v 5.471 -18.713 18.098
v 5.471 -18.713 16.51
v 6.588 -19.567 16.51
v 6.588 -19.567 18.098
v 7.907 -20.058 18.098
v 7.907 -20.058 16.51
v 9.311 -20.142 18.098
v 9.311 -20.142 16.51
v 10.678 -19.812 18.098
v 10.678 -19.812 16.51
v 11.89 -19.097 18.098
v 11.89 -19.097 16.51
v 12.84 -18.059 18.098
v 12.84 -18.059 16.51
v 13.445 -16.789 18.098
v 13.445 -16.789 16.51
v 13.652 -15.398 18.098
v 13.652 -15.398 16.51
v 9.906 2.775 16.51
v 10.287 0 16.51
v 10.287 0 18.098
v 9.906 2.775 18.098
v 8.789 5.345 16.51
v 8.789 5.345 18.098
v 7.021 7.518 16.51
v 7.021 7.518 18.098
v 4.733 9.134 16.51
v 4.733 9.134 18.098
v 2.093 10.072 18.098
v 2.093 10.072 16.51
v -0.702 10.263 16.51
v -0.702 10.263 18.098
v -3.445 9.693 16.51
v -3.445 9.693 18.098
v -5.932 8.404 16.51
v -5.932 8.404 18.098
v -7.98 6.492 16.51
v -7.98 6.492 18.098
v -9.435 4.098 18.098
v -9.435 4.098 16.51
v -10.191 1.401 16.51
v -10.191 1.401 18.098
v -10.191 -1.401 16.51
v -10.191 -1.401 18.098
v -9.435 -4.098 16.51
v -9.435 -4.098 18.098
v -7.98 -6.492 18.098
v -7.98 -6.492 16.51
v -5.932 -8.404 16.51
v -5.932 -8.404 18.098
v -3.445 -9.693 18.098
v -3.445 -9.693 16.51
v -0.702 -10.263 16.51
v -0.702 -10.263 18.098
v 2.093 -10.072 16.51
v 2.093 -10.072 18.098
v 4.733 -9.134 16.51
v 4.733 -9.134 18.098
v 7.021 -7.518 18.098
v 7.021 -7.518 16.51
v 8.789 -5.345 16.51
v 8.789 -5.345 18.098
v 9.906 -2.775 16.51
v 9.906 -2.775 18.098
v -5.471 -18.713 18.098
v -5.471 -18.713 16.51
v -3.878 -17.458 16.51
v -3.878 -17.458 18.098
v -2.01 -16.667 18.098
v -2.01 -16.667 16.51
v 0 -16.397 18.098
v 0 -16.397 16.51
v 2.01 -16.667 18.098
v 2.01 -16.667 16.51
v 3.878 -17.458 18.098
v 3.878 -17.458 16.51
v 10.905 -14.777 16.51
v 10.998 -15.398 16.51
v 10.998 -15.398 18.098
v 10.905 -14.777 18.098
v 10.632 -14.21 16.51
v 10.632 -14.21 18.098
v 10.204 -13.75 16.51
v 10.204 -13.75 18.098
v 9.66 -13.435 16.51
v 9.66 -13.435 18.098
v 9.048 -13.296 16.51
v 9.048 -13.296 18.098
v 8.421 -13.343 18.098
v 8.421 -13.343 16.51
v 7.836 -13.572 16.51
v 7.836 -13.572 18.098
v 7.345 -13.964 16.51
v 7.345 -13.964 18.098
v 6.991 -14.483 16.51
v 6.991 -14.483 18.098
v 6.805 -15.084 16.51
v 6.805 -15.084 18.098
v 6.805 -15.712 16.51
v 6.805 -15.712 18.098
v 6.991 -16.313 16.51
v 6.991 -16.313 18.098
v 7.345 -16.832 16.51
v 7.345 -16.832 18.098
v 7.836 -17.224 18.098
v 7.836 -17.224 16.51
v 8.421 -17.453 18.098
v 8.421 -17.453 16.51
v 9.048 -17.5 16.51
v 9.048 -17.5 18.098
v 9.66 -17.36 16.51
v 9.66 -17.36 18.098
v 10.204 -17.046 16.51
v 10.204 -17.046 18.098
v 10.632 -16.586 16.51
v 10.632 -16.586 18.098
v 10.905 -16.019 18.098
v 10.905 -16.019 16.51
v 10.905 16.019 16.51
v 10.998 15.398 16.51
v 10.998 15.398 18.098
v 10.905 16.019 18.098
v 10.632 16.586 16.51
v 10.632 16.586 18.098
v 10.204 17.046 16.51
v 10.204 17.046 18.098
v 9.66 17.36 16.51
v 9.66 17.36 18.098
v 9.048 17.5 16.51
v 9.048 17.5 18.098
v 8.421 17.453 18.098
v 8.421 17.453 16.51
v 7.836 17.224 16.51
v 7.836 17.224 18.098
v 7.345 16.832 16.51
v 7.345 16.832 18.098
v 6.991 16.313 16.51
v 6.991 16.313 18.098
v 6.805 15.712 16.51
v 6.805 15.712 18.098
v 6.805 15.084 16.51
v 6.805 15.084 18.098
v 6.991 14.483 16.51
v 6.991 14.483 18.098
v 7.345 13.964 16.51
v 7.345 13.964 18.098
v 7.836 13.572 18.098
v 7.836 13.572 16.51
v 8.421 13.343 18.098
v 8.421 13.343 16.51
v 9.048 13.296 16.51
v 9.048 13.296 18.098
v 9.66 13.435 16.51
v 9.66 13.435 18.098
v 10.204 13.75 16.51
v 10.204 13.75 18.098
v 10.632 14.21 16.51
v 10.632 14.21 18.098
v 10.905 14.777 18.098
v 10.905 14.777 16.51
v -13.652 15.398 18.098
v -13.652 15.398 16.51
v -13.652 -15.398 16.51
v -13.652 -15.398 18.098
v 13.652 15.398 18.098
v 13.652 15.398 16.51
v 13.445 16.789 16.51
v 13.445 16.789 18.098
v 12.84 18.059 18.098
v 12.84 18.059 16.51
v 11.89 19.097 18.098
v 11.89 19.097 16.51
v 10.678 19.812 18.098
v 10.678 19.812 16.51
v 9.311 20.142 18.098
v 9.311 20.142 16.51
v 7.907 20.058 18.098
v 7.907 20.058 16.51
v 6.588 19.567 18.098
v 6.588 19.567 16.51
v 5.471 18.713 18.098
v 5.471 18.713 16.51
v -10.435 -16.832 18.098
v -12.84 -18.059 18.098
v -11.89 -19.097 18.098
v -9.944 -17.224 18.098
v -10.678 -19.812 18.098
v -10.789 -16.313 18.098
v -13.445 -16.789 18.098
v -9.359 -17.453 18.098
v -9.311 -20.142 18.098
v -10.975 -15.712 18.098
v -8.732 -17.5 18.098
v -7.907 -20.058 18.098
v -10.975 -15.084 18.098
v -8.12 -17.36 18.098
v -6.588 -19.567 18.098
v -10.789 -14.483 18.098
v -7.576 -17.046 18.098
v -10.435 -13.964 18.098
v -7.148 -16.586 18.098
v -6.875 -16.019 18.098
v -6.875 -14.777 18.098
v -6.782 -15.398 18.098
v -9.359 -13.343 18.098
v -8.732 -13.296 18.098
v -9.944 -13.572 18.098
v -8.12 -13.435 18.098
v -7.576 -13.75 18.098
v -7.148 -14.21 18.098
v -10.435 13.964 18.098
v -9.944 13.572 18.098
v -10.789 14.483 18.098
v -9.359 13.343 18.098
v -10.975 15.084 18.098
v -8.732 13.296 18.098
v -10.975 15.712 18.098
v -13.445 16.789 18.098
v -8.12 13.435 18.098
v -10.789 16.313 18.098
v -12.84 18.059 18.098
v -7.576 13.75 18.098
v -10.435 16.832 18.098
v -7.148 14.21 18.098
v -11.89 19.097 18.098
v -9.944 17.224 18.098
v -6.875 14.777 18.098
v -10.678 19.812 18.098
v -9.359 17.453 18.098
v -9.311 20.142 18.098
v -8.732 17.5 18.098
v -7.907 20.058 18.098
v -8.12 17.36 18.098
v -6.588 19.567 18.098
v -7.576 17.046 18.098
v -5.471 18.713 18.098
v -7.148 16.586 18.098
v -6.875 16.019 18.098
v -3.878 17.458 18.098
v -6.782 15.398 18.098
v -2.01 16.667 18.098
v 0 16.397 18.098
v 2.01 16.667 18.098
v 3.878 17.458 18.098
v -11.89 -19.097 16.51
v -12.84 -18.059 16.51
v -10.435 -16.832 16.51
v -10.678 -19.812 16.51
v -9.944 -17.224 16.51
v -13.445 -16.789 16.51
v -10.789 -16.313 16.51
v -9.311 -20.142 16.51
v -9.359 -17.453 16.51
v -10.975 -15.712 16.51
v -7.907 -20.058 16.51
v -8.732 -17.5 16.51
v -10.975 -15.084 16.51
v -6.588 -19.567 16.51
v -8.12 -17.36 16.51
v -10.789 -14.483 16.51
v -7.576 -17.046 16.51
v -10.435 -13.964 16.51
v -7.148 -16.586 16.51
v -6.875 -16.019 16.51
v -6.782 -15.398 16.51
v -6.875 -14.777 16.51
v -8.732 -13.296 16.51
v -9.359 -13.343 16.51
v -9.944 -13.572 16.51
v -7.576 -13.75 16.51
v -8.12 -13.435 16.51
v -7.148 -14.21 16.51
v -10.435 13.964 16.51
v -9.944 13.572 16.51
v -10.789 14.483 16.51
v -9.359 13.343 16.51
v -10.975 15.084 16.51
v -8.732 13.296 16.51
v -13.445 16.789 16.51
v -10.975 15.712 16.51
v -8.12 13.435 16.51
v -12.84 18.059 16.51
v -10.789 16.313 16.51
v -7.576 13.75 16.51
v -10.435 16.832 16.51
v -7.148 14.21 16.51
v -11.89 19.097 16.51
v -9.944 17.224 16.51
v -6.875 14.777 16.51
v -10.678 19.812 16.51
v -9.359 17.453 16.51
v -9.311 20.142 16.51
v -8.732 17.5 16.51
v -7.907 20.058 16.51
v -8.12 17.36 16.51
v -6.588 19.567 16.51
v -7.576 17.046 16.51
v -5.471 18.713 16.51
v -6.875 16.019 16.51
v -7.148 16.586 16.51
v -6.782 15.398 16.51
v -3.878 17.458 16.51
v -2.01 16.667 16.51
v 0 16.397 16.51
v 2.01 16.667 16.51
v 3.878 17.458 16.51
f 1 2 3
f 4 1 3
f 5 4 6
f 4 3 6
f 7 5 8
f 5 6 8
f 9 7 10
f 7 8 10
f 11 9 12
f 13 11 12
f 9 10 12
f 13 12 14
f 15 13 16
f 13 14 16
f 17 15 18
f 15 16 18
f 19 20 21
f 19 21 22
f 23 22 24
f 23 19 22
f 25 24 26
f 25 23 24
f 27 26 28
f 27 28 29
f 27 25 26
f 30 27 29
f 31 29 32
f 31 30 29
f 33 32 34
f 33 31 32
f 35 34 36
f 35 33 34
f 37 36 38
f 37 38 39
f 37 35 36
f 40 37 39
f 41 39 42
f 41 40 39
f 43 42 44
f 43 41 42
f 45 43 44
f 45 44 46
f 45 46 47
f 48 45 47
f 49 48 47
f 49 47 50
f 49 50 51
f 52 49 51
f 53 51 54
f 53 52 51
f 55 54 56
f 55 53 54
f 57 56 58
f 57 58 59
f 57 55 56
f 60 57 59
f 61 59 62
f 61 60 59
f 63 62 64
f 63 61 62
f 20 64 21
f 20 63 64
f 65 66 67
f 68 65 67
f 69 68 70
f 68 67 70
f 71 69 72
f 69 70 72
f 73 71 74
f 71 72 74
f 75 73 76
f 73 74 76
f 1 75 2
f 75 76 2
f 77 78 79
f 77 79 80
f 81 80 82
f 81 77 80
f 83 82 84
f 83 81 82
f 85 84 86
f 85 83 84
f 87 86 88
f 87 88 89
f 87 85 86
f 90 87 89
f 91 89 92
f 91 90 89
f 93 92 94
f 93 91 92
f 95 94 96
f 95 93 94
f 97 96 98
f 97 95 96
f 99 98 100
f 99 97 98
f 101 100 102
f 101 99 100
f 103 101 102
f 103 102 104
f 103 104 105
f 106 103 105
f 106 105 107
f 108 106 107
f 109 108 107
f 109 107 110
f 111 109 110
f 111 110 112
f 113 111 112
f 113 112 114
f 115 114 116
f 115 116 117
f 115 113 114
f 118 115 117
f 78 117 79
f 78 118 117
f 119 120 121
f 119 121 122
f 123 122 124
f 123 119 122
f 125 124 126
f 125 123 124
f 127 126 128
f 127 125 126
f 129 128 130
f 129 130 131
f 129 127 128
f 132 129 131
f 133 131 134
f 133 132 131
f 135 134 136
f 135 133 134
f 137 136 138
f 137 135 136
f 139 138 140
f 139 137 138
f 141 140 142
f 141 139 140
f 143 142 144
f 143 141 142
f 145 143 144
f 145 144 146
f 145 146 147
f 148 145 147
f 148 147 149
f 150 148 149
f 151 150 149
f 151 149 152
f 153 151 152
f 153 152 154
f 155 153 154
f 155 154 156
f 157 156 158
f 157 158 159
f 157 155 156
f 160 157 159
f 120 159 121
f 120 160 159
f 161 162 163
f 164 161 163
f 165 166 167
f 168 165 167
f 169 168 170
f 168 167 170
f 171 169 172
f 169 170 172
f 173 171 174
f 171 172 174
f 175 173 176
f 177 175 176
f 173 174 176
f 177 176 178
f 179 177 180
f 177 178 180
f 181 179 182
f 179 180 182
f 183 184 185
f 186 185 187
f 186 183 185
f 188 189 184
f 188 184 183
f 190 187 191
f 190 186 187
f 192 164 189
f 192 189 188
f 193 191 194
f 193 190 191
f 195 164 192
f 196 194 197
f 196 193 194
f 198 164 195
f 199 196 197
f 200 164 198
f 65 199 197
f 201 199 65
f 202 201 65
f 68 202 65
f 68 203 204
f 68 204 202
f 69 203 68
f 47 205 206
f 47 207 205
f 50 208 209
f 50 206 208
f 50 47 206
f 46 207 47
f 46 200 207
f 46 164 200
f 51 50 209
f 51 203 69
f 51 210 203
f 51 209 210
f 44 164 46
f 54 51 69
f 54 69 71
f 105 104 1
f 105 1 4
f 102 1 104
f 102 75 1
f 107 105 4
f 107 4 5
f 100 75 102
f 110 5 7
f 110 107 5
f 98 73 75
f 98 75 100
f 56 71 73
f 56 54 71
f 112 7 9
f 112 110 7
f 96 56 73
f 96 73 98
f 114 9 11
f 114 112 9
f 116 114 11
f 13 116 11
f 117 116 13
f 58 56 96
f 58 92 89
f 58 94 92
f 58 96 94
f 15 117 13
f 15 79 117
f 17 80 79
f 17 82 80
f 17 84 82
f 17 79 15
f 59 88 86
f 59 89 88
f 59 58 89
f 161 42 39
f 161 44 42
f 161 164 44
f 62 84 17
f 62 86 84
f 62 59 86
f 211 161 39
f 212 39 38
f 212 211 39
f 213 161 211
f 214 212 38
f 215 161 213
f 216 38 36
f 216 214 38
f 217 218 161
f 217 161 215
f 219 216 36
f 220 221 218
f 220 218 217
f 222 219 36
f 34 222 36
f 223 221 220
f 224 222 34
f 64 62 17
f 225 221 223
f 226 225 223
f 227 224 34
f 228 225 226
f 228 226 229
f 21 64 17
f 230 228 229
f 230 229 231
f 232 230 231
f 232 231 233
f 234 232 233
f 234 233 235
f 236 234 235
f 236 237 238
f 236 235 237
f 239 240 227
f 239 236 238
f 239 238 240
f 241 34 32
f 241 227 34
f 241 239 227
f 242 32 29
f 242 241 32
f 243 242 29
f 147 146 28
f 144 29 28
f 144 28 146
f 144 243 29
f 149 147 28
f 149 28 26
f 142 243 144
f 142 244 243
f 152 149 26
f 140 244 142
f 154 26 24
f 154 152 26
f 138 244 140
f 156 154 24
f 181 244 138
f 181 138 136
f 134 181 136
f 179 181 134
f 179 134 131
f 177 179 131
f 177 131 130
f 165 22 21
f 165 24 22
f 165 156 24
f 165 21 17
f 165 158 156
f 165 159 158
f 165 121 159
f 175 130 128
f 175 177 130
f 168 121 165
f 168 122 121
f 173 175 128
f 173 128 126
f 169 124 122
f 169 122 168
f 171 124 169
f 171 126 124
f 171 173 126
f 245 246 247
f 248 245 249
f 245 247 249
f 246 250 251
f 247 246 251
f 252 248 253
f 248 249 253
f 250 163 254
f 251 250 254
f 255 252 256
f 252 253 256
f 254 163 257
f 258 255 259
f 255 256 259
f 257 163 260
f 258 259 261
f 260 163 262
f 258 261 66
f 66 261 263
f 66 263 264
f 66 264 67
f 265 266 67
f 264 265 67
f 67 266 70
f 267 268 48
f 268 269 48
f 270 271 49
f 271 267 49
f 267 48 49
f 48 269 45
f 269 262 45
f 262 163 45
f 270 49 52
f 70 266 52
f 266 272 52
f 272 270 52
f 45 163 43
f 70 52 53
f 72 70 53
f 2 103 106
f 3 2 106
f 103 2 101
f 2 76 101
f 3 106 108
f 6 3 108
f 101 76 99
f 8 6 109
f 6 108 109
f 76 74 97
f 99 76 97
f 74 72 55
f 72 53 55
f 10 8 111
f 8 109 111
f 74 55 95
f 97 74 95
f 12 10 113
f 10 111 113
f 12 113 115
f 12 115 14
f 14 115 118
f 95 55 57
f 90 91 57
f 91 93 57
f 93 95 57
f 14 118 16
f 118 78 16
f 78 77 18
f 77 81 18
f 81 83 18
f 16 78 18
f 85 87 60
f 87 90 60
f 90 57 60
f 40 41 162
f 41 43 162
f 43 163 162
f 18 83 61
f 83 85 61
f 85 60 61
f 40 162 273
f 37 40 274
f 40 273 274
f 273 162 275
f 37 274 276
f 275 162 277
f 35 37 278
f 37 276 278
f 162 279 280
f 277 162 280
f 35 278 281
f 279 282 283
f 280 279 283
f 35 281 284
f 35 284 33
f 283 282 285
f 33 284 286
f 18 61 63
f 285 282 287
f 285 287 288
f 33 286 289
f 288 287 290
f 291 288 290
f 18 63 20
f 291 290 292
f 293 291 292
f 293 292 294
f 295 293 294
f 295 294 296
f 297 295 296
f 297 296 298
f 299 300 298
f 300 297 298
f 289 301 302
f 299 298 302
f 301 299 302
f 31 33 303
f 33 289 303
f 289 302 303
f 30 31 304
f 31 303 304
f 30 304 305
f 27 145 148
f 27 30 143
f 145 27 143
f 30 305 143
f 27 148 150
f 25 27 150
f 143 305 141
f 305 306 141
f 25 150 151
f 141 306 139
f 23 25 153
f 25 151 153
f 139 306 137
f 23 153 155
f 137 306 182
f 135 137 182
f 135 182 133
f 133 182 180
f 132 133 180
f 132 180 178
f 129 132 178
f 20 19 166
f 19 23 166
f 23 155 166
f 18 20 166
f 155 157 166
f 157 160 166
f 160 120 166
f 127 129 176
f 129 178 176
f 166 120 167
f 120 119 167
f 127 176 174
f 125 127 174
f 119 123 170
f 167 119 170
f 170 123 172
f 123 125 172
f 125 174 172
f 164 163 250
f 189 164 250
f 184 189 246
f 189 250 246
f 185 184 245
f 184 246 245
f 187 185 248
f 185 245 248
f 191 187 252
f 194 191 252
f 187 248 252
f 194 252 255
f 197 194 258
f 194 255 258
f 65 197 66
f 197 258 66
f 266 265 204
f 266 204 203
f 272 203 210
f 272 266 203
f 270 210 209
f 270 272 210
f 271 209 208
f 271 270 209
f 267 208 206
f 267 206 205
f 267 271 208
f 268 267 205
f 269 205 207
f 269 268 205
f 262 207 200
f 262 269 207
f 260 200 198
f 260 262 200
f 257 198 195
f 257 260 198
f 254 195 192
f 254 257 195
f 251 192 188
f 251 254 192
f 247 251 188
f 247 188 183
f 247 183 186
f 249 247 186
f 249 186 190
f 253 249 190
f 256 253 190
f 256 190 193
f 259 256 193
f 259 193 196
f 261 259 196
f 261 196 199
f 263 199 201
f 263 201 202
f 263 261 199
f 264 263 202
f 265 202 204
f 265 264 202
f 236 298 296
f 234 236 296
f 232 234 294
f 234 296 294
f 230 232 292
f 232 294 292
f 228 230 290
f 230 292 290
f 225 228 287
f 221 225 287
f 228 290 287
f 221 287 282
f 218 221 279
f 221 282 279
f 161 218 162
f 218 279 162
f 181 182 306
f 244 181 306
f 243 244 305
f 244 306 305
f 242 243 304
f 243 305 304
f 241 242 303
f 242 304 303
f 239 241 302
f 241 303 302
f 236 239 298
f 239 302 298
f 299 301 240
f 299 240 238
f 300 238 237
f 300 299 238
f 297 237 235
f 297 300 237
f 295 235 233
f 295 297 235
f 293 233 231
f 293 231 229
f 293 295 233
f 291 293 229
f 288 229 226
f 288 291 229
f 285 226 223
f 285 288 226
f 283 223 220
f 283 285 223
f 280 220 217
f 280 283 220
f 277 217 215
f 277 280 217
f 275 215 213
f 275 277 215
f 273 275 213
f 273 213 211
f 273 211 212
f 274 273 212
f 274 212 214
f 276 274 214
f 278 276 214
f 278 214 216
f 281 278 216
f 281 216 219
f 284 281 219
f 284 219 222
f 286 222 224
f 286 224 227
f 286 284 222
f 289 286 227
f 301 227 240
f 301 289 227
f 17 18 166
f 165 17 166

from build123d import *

# Parameters (mm, degrees)
SKETCH1_R           = 2.1082
SKETCH1_R_2         = 10.287
BOSS_EXTRUDE1_DEPTH = 1.5875


with BuildPart() as part:
    # Sketch1 → Boss-Extrude1 (new body)
    with BuildSketch(Plane.XY.offset(16.51)):
        with BuildLine():
            Line((13.6525, -15.397931679), (13.6525, 15.397931679))
            ThreePointArc((13.6525, 15.397931679), (10.678479761, 19.811858094), (5.470769231, 18.71308887))
            ThreePointArc((5.470769231, 18.71308887), (0, 16.397340374), (-5.470769231, 18.71308887))
            ThreePointArc((-5.470769231, 18.71308887), (-10.678479761, 19.811858094), (-13.6525, 15.397931679))
            Line((-13.6525, 15.397931679), (-13.6525, -15.397931679))
            ThreePointArc((-13.6525, -15.397931679), (-10.678479761, -19.811858094), (-5.470769231, -18.71308887))
            ThreePointArc((-5.470769231, -18.71308887), (0, -16.397340374), (5.470769231, -18.71308887))
            ThreePointArc((5.470769231, -18.71308887), (10.678479761, -19.811858094), (13.6525, -15.397931679))
        make_face()
        with Locations((8.89, -15.397931679)):
            Circle(SKETCH1_R, mode=Mode.SUBTRACT)
        with Locations((-8.89, -15.397931679)):
            Circle(SKETCH1_R, mode=Mode.SUBTRACT)
        Circle(SKETCH1_R_2, mode=Mode.SUBTRACT)
        with Locations((8.89, 15.397931679)):
            Circle(SKETCH1_R, mode=Mode.SUBTRACT)
        with Locations((-8.89, 15.397931679)):
            Circle(SKETCH1_R, mode=Mode.SUBTRACT)
    extrude(amount=BOSS_EXTRUDE1_DEPTH)


solid = part.part
